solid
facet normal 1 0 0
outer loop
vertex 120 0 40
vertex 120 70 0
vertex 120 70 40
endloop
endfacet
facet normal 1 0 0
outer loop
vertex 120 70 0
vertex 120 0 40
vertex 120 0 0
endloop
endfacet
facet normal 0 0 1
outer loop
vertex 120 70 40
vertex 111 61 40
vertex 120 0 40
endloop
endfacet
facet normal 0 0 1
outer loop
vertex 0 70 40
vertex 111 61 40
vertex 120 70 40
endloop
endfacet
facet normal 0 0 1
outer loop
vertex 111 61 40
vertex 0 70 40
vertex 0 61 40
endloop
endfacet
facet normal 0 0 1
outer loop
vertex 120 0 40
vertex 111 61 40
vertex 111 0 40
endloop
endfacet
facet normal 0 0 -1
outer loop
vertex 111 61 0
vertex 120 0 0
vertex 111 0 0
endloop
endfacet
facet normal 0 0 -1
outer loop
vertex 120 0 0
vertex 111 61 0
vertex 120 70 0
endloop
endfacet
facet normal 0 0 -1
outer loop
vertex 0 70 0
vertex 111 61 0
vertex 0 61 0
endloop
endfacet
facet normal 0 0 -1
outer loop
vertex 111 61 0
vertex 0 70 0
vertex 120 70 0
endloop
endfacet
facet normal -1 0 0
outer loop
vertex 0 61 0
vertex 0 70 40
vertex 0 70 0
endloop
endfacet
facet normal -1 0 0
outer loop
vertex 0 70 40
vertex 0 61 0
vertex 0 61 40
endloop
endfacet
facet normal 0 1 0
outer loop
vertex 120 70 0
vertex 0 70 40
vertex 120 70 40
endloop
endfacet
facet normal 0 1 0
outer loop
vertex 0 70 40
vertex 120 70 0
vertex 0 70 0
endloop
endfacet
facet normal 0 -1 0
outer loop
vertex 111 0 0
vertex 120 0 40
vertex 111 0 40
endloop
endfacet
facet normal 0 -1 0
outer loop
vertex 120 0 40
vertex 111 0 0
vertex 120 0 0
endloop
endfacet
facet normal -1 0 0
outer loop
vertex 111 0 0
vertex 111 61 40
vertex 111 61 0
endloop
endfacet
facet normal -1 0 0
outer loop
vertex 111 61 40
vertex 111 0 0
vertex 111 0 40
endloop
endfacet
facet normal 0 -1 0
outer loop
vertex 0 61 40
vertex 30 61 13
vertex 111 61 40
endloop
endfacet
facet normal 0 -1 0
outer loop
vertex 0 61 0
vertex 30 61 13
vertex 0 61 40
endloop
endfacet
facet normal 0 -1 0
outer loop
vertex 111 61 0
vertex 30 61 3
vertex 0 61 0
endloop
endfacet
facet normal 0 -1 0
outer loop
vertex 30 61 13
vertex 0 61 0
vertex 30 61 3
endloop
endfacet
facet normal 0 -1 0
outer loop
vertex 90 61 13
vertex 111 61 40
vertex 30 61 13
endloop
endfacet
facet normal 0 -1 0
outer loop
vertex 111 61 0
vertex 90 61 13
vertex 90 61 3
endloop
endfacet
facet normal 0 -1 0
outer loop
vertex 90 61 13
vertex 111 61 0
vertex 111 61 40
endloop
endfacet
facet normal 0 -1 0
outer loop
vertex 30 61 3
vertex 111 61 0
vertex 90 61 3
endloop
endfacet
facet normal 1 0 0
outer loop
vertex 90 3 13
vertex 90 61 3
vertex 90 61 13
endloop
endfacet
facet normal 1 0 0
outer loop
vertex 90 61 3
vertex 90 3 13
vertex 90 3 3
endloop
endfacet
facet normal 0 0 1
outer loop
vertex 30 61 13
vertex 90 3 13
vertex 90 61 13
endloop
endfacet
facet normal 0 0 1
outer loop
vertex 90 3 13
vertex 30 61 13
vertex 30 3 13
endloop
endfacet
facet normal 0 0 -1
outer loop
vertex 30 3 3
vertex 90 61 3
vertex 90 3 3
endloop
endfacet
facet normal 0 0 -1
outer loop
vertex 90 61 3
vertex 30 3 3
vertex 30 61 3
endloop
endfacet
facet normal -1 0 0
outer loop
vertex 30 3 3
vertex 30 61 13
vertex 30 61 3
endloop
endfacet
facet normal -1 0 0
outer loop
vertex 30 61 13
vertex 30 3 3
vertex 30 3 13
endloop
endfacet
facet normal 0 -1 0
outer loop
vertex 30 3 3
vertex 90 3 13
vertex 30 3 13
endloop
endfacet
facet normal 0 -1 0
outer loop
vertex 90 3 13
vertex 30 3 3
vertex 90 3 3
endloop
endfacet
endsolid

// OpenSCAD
// Buffer Tank for Mini Horizontal Gel Electrophoresis
// Units: millimetres

// Outer Dimensions
$w_outer = 120; // Width (X)
$d_outer = 70;  // Depth (Y)
$h_outer = 40;  // Height (Z)

// Wall and Floor Thickness
$wall_thick = 3;
$floor_thick = 3;

// Platform Dimensions
$p_len = 60;    // Length (X)
$p_width = $d_outer - (2 * $wall_thick); // Spans full inner width (Y)
$p_height = 10; // Height above inner floor
$p_z_base = $floor_thick + $p_height; // Z position of platform top

// Hole Dimensions
$hole_dia = 2;
$hole_y = 0;
$hole_z = 30;

// Configuration
$fn = 128; // High resolution for smooth curves and accurate hole sizing

// Calculate Inner Dimensions
$w_inner = $w_outer - (2 * $wall_thick);
$d_inner = $d_outer - (2 * $wall_thick);
$h_inner = $h_outer - $floor_thick;

// Main Tank Body
// Constructed as a hollow box with a floor
difference() {
    // Outer Block
    cube([
        $w_outer, 
        $d_outer, 
        $h_outer
    ], center = false);
    
    // Cut out the open top and inner void
    // We subtract a block that is the size of the inner void + top opening
    translate([
        -$wall_thick, 
        -$wall_thick, 
        0
    ]) {
        cube([
            $w_inner, 
            $d_inner, 
            $h_outer
        ], center = false);
    }
}

// Raised Platform
// Located in the middle of the tank, spanning full inner width
translate([
    ($w_outer / 2) - ($p_len / 2), // Center in X
    ($d_outer / 2) - ($p_width / 2), // Center in Y
    $floor_thick // Base on the floor
]) {
    // Platform is a solid block
    cube([
        $p_len, 
        $p_width, 
        $p_height
    ], center = false);
}

// Electrode Holes
// Two holes: one at each end wall (X ends), along the X axis
// Position: y = 0, z = 30
// We use a loop to create the two holes at x = -60 and x = 60 (approx ends)
// Actually, the ends are at x = +/- ($w_outer/2 - $wall_thick/2) relative to center?
// No, the hole is "Through each end wall". 
// End walls are at X = -60 and X = +60 (outer edges).
// The hole goes through the wall thickness along X.
// Center of hole in X should be at the inner face of the end wall? 
// Or centered in the wall? Usually centered in the wall thickness.
// Wall thickness is 3mm. So center is at X = +/- (60 - 1.5) = +/- 58.5.

$hole_x_pos = [$w_outer/2 - $wall_thick/2, -$w_outer/2 + $wall_thick/2];

difference() {
    // Re-select the main assembly to cut holes
    // Note: In OpenSCAD, difference() applies to the current context. 
    // We need to rebuild the object or use a temporary variable.
    // Since we cannot use variables for complex unions easily in one pass without re-defining,
    // we will reconstruct the base geometry here specifically for the hole operation.
    
    // 1. Outer Block
    cube([
        $w_outer, 
        $d_outer, 
        $h_outer
    ], center = false);
    
    // 2. Inner Void (Open top)
    translate([
        -$wall_thick, 
        -$wall_thick, 
        0
    ]) {
        cube([
            $w_inner, 
            $d_inner, 
            $h_outer
        ], center = false);
    }
    
    // 3. Platform
    translate([
        ($w_outer / 2) - ($p_len / 2), 
        ($d_outer / 2) - ($p_width / 2), 
        $floor_thick
    ]) {
        cube([
            $p_len, 
            $p_width, 
            $p_height
        ], center = false);
    }
    
    // 4. Cut Holes
    for (i = [0 : 1]) {
        $x = $hole_x_pos[i];
        
        // Cylinder for the hole
        // Extend slightly past the wall thickness to ensure clean cut
        translate([
            $x, 
            $hole_y, 
            $hole_z
        ]) {
            cylinder(
                h = $w_outer + 1, // Extend past both ends
                r = $hole_dia / 2,
                $fn = $fn
            );
        }
    }
}
